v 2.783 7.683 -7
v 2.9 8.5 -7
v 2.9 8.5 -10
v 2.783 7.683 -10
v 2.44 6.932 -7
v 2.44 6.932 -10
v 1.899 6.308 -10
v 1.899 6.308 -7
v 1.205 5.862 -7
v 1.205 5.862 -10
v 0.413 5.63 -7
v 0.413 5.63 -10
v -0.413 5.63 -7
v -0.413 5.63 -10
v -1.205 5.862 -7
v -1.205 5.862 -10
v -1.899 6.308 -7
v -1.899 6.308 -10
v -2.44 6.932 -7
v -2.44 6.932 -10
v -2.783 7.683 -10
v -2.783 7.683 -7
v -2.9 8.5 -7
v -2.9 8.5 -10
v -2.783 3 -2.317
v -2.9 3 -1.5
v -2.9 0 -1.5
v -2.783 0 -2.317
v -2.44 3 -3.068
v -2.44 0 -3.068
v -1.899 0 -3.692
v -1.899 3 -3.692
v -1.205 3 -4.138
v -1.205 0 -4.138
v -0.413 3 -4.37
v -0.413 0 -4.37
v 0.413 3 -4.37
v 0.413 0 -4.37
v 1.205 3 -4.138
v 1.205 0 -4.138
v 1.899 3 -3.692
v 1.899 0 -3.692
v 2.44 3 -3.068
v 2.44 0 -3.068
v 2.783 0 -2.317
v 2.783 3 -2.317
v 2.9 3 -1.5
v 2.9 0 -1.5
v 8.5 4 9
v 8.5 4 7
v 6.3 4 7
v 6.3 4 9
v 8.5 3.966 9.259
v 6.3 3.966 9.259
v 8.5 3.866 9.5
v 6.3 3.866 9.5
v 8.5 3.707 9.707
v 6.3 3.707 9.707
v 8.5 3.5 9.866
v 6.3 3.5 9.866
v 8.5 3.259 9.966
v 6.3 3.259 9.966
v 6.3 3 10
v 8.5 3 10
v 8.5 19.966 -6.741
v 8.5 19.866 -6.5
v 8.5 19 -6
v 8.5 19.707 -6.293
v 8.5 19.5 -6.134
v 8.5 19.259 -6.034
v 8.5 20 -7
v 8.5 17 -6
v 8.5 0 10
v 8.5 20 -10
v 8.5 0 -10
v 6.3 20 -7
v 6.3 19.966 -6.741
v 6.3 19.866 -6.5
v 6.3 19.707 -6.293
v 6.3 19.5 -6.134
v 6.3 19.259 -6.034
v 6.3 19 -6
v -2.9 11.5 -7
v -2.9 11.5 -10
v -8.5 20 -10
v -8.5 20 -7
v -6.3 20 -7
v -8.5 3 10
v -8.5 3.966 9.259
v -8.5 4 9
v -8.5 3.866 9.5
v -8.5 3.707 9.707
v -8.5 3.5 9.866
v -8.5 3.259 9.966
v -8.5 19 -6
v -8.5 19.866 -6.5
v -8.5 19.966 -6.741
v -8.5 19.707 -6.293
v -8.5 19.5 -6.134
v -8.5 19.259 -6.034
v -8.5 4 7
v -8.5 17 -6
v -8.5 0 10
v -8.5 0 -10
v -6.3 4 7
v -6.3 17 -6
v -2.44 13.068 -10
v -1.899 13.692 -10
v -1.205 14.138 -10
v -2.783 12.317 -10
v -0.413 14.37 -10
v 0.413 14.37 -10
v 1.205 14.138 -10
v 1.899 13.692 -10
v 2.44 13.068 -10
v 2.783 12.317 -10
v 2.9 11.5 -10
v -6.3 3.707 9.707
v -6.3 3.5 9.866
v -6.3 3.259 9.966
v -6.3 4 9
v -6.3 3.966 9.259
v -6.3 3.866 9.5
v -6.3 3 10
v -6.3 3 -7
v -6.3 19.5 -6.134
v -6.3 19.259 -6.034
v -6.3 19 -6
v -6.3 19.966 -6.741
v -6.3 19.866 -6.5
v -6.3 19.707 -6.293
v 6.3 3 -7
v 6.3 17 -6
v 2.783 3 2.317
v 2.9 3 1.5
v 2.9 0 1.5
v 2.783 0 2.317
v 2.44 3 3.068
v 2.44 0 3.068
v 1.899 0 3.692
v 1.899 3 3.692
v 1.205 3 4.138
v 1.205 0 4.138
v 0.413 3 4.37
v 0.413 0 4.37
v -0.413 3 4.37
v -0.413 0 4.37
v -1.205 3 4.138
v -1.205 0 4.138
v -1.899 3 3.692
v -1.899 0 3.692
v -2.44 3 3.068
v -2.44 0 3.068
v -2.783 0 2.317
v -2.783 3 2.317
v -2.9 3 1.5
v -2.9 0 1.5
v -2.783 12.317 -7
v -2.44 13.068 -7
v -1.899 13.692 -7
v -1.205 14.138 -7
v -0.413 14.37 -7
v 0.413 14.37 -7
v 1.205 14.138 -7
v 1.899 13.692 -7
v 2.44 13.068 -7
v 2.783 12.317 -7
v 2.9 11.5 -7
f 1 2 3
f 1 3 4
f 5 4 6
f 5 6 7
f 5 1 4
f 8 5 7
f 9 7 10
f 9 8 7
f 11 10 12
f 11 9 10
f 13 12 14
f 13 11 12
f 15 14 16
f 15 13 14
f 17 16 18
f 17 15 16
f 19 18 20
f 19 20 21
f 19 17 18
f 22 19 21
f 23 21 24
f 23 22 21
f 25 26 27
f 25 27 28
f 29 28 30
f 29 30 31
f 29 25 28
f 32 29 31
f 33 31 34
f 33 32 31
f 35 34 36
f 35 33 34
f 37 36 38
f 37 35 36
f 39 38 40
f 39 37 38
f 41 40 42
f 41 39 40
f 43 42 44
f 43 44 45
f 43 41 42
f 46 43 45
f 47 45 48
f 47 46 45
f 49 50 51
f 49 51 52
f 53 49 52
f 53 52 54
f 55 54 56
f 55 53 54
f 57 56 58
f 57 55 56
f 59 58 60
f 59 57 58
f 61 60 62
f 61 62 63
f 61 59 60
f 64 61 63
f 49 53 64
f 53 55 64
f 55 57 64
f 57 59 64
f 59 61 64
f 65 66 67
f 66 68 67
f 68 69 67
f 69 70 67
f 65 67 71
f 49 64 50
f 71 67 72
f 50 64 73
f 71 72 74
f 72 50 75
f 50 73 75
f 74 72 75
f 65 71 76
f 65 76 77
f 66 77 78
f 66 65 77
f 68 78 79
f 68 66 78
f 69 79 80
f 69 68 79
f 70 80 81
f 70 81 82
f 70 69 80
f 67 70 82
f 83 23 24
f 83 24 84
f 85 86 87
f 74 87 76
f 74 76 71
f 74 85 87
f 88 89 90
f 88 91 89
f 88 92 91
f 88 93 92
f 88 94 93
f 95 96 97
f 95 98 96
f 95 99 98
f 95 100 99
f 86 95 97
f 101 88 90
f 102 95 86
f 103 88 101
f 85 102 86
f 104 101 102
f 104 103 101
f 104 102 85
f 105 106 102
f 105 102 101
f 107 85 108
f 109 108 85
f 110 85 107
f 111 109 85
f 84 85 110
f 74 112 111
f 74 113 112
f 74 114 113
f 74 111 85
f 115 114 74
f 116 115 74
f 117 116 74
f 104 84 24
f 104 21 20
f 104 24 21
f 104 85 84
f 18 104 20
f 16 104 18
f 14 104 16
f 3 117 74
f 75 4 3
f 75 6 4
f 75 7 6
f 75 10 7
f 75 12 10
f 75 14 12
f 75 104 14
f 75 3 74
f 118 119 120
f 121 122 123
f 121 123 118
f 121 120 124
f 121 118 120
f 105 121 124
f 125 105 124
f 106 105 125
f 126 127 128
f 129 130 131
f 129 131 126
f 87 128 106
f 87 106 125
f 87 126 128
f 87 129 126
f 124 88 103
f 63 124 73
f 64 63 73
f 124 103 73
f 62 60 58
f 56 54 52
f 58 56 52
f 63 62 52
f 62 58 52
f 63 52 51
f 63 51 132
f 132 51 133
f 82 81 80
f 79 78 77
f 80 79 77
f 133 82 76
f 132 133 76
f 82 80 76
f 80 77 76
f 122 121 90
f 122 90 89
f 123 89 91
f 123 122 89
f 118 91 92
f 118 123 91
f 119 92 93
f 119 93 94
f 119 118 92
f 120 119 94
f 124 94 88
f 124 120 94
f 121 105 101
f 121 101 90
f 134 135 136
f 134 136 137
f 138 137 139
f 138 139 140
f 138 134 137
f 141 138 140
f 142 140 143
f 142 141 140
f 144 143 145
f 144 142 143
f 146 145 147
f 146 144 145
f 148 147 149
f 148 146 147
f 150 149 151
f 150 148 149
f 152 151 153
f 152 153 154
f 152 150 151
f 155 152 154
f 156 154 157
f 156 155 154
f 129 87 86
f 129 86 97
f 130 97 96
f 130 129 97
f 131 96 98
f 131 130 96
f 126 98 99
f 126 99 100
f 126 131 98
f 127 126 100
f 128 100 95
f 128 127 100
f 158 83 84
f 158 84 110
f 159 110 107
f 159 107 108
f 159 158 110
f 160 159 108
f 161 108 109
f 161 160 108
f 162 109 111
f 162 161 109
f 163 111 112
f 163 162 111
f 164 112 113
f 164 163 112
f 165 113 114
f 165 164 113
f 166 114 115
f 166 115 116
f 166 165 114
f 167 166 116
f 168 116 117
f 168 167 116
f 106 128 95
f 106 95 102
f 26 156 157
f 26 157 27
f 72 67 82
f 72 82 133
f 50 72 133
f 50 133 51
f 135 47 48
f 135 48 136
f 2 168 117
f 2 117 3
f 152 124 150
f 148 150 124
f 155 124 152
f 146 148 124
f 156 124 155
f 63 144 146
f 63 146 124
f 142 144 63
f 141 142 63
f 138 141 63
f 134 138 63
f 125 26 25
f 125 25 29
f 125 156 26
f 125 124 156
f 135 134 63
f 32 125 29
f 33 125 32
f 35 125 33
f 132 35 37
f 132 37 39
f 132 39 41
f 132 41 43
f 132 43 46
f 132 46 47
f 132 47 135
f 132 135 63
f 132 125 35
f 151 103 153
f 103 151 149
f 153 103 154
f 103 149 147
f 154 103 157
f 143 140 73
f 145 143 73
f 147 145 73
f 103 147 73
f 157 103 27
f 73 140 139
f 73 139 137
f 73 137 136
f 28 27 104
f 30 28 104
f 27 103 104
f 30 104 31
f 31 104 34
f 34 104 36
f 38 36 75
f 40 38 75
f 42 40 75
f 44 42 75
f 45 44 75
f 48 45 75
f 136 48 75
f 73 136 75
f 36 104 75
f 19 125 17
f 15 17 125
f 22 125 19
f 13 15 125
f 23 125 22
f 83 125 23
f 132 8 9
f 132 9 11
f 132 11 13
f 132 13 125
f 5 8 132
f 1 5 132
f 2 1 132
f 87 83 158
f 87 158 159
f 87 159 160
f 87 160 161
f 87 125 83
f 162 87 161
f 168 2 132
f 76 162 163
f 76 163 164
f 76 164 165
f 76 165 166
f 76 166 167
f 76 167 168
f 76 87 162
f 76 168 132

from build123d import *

# Parameters (mm, degrees)
SKETCH_1_W          = 17
SKETCH_1_H          = 20
EXTRUDE_1_DEPTH     = 20
SKETCH_2_W          = 12.6
SKETCH_2_H          = 17
CUT_EXTRUDE_1_DEPTH = 17
CUT_EXTRUDE_2_DEPTH = 17
CUT_EXTRUDE_3_DEPTH = 3
CUT_EXTRUDE_4_DEPTH = 3


with BuildPart() as part:
    # 草图1 → 凸台-拉伸1 (new body)
    with BuildSketch(Plane(origin=(0, 0, 0), x_dir=(1, 0, 0), z_dir=(0, 1, 0))):
        Rectangle(SKETCH_1_W, SKETCH_1_H)
    extrude(amount=EXTRUDE_1_DEPTH)

    # 草图2 → 切除-拉伸1 (cut)
    with BuildSketch(Plane(origin=(0, 20, 0), x_dir=(1, 0, 0), z_dir=(0, 1, 0))):
        with Locations((0, -1.5)):
            Rectangle(SKETCH_2_W, SKETCH_2_H)
    extrude(amount=-CUT_EXTRUDE_1_DEPTH, mode=Mode.SUBTRACT)

    # 草图3 → 切除-拉伸2 (cut)
    with BuildSketch(Plane(origin=(8.5, 0, 0), x_dir=(0, 0, -1), z_dir=(1, 0, 0))):
        with BuildLine():
            Line((6, 19), (6, 17))
            Line((6, 17), (-7, 4))
            Line((-7, 4), (-9, 4))
            ThreePointArc((-9, 4), (-9.707106781, 3.707106781), (-10, 3))
            Line((-10, 3), (-10, 20))
            Line((-10, 20), (7, 20))
            ThreePointArc((7, 20), (6.292893219, 19.707106781), (6, 19))
        make_face()
    extrude(amount=-CUT_EXTRUDE_2_DEPTH, mode=Mode.SUBTRACT)

    # 草图4 → 切除-拉伸3 (cut)
    with BuildSketch(Plane.XY.offset(-7)):
        with BuildLine():
            Line((2.9, 11.5), (2.9, 8.5))
            ThreePointArc((2.9, 8.5), (0, 5.6), (-2.9, 8.5))
            Line((-2.9, 8.5), (-2.9, 11.5))
            ThreePointArc((-2.9, 11.5), (0, 14.4), (2.9, 11.5))
        make_face()
    extrude(amount=-CUT_EXTRUDE_3_DEPTH, mode=Mode.SUBTRACT)

    # 草图5 → 切除-拉伸4 (cut)
    with BuildSketch(Plane(origin=(0, 3, 0), x_dir=(1, 0, 0), z_dir=(0, 1, 0))):
        with BuildLine():
            Line((2.9, 1.5), (2.9, -1.5))
            ThreePointArc((2.9, -1.5), (0, -4.4), (-2.9, -1.5))
            Line((-2.9, -1.5), (-2.9, 1.5))
            ThreePointArc((-2.9, 1.5), (0, 4.4), (2.9, 1.5))
        make_face()
    extrude(amount=-CUT_EXTRUDE_4_DEPTH, mode=Mode.SUBTRACT)


solid = part.part
